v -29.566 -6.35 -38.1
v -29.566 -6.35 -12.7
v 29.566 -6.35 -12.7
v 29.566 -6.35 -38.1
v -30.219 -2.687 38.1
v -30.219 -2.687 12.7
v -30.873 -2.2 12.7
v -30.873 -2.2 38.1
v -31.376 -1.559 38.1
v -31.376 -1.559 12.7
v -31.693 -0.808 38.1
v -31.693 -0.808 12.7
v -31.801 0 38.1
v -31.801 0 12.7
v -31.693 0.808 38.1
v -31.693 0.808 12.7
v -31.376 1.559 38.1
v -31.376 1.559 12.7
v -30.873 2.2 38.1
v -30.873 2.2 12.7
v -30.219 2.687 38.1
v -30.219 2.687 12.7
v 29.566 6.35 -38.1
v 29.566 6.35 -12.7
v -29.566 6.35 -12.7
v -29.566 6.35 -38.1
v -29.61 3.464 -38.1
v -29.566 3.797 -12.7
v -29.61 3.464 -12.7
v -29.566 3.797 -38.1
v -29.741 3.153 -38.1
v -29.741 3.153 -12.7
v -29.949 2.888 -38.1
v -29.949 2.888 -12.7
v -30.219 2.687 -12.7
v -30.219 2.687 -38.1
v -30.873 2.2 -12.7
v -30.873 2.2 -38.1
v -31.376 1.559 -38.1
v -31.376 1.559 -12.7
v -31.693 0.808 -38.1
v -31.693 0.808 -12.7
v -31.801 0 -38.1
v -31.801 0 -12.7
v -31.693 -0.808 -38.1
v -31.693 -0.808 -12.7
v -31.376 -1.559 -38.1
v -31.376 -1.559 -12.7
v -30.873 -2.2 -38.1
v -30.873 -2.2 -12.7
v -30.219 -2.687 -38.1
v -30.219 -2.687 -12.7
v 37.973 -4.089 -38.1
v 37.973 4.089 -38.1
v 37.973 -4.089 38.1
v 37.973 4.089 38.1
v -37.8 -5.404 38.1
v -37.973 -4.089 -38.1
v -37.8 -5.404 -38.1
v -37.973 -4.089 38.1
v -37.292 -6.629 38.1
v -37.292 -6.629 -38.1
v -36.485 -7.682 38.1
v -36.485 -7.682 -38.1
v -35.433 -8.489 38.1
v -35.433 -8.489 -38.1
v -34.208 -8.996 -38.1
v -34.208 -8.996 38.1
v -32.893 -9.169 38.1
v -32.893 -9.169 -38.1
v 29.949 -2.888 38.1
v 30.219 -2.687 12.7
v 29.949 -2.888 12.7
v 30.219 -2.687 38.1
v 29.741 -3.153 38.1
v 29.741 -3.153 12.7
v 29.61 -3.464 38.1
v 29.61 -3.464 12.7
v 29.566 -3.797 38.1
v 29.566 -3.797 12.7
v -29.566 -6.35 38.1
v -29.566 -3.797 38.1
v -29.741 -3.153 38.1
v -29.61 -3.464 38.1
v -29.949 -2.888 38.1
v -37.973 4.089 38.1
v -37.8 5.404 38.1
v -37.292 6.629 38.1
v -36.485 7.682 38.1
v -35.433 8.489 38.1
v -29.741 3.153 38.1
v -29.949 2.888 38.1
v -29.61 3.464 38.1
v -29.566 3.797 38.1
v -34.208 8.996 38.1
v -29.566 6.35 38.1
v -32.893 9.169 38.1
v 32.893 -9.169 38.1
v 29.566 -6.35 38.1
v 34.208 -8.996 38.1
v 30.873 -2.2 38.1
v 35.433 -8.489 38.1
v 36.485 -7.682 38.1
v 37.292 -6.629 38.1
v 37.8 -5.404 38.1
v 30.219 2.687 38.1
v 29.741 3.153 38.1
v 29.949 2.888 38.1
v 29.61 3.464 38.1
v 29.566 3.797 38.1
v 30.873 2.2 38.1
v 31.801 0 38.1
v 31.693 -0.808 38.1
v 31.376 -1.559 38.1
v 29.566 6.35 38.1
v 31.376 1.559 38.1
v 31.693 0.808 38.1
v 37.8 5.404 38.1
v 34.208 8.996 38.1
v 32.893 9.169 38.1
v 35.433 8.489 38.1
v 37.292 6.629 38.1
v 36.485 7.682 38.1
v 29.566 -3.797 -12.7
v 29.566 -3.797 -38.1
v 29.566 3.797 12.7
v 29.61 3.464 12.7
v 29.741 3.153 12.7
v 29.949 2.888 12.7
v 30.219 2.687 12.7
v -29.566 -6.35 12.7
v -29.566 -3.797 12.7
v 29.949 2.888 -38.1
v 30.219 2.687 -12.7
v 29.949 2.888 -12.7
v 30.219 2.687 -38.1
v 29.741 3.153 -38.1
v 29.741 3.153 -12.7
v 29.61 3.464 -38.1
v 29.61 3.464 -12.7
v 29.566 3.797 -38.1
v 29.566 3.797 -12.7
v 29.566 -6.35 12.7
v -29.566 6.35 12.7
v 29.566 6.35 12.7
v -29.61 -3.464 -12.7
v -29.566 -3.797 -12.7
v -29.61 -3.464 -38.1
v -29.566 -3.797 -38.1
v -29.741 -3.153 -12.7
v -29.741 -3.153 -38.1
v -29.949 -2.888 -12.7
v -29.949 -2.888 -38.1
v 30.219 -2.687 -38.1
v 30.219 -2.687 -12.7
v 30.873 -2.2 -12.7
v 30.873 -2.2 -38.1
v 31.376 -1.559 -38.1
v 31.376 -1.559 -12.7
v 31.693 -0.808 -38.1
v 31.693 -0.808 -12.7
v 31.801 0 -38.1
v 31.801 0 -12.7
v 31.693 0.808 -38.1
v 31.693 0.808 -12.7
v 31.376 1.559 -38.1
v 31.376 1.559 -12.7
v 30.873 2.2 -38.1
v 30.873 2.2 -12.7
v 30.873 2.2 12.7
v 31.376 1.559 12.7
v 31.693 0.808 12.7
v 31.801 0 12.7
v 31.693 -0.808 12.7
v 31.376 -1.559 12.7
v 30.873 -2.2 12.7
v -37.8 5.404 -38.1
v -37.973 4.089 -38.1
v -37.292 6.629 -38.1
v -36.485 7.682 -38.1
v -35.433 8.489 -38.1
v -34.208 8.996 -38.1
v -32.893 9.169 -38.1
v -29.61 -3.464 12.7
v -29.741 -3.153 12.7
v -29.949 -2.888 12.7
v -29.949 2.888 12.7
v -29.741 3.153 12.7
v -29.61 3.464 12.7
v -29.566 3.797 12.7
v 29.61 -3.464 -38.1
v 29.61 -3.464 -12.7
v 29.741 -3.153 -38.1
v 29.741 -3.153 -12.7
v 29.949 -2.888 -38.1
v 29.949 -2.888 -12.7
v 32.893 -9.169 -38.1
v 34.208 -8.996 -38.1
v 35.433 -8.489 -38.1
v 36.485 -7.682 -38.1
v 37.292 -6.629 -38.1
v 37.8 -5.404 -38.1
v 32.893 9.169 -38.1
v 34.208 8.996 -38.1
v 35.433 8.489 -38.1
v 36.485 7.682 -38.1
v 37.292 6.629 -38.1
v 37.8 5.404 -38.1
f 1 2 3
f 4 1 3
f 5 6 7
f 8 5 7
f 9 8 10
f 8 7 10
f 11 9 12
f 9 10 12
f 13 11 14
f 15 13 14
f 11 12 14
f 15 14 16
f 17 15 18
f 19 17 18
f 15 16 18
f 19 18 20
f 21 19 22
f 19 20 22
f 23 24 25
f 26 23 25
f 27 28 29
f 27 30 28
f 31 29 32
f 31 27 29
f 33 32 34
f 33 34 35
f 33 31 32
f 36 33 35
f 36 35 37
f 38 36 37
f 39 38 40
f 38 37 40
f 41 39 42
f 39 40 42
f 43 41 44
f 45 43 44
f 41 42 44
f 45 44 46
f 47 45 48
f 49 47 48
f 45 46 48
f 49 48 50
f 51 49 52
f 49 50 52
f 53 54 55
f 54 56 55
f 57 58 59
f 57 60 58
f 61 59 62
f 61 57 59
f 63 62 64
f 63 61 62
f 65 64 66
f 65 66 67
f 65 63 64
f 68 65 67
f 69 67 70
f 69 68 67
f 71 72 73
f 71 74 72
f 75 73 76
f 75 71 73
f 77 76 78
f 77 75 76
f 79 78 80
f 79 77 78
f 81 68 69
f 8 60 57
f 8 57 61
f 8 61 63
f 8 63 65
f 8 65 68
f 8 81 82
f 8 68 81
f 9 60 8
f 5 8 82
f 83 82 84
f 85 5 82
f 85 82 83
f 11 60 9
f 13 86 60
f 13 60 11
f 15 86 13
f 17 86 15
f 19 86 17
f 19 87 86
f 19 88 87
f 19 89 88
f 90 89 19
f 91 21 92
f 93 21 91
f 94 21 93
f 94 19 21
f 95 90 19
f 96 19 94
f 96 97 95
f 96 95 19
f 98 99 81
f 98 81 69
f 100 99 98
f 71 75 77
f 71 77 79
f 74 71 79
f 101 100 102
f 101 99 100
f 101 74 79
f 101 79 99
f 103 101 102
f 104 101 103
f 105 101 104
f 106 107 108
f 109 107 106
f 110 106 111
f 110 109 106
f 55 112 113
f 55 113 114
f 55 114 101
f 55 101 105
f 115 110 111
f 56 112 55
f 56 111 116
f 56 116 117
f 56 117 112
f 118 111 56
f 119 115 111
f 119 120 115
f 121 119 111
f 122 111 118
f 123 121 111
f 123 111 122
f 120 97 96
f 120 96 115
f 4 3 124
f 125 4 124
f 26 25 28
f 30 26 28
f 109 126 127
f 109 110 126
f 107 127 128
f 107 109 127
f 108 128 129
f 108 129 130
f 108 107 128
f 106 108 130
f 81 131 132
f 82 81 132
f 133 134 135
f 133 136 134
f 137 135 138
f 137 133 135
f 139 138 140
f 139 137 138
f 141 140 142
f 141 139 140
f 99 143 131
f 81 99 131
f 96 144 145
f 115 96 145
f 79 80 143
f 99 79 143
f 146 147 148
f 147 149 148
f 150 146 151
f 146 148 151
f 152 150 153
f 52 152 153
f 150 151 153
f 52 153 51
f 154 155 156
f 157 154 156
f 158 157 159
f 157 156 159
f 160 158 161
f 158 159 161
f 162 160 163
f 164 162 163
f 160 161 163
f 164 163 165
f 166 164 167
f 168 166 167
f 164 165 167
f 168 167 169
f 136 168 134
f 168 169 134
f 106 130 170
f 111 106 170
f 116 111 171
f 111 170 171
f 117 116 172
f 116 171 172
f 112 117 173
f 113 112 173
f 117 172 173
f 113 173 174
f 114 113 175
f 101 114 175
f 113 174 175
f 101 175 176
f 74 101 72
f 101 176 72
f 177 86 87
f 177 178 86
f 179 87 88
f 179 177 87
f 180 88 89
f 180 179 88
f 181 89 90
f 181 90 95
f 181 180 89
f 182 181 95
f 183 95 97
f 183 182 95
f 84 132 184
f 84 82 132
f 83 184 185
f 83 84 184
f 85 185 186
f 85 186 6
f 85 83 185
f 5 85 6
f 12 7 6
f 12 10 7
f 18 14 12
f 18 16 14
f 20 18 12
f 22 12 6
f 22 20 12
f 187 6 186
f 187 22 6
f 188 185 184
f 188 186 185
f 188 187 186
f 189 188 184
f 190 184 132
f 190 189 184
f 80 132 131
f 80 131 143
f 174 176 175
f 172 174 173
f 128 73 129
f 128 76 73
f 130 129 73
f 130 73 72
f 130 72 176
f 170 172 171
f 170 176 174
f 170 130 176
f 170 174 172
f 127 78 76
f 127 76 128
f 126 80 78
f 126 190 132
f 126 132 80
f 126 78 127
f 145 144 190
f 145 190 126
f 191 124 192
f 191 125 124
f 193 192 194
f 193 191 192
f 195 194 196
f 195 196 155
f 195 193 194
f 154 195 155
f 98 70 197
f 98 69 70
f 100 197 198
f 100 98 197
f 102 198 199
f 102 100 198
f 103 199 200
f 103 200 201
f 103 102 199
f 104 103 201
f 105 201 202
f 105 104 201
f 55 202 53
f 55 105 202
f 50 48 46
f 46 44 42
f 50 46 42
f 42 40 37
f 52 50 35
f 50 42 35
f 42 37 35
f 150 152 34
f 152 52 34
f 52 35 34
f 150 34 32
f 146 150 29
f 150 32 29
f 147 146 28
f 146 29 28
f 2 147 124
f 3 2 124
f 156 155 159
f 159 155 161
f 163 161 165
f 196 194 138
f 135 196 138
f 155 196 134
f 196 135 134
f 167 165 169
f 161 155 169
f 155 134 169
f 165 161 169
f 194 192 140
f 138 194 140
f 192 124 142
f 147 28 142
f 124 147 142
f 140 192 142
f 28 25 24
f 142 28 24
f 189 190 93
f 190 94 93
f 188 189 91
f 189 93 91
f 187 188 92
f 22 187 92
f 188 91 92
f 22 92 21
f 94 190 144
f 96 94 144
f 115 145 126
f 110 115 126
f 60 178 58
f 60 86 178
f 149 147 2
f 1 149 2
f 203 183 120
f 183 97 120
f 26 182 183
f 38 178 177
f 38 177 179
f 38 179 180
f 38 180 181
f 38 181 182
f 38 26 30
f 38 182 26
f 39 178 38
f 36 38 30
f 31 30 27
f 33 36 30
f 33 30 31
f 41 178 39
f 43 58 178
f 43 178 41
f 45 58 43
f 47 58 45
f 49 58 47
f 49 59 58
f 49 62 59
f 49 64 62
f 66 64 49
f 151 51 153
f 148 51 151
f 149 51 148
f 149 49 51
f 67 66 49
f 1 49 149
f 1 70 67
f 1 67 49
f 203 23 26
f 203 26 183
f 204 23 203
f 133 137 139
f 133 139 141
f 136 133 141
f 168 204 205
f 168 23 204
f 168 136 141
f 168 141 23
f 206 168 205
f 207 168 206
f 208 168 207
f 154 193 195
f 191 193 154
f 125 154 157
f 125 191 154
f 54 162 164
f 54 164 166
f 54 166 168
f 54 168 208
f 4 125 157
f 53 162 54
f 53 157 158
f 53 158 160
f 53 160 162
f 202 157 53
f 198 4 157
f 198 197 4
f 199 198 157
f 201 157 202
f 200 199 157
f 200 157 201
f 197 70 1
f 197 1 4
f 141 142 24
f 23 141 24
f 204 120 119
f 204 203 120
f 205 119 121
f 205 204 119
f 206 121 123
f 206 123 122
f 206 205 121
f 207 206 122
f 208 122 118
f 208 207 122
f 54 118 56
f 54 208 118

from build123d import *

# Parameters (mm, degrees)
F0_W     = 75.946
F0_H     = 18.3388
F1_DEPTH = 12.7
F2_W     = 75.946
F2_H     = 18.3388
F4_DEPTH = 25.4
F3_W     = 75.946
F3_H     = 18.3388
F5_DEPTH = 25.4
F6_R     = 1.27
F7_R     = 5.08


with BuildPart() as f1:
    # F0 (on Top) → F1 (new body, symmetric)
    with BuildSketch(Plane.XY):
        Rectangle(F0_W, F0_H)
    extrude(amount=F1_DEPTH, both=True)

    # F2 (on face) → F4 (join)
    with BuildSketch(Plane.XY.offset(12.7)):
        Rectangle(F2_W, F2_H)
        with BuildLine():
            Line((-29.5656, 2.956892), (-29.5656, 6.35))
            Line((-29.5656, 6.35), (29.5656, 6.35))
            Line((29.5656, 6.35), (29.5656, 2.956892))
            ThreePointArc((29.5656, 2.956892), (31.8008, 0), (29.5656, -2.956892))
            Line((29.5656, -2.956892), (29.5656, -6.35))
            Line((29.5656, -6.35), (-29.5656, -6.35))
            Line((-29.5656, -6.35), (-29.5656, -2.956892))
            ThreePointArc((-29.5656, -2.956892), (-31.8008, 0), (-29.5656, 2.956892))
        make_face(mode=Mode.SUBTRACT)
    extrude(amount=F4_DEPTH)

    # F3 (on face) → F5 (join)
    with BuildSketch(Plane(origin=(0, 0, -12.7), x_dir=(1, 0, 0), z_dir=(0, 0, -1))):
        Rectangle(F3_W, F3_H)
        with BuildLine():
            Line((-29.5656, 2.956892), (-29.5656, 6.35))
            Line((-29.5656, 6.35), (29.5656, 6.35))
            Line((29.5656, 6.35), (29.5656, 2.956892))
            ThreePointArc((29.5656, 2.956892), (31.8008, 0), (29.5656, -2.956892))
            Line((29.5656, -2.956892), (29.5656, -6.35))
            Line((29.5656, -6.35), (-29.5656, -6.35))
            Line((-29.5656, -6.35), (-29.5656, -2.956892))
            ThreePointArc((-29.5656, -2.956892), (-31.8008, 0), (-29.5656, 2.956892))
        make_face(mode=Mode.SUBTRACT)
    extrude(amount=F5_DEPTH)

    # F6
    f6_edges = [f1.edges().sort_by_distance(p)[0] for p in [
        (-29.5656, 2.956892, 25.4),
        (-29.5656, -2.956892, 25.4),
        (29.5656, -2.956892, 25.4),
        (29.5656, 2.956892, 25.4),
        (-29.5656, -2.956892, -25.4),
        (-29.5656, 2.956892, -25.4),
        (29.5656, 2.956892, -25.4),
        (29.5656, -2.956892, -25.4),
    ]]
    fillet(f6_edges, radius=F6_R)

    # F7
    f7_edges = [f1.edges().sort_by_distance(p)[0] for p in [
        (37.973, -9.1694, 0),
        (37.973, 9.1694, 0),
        (-37.973, -9.1694, 0),
        (-37.973, 9.1694, 0),
    ]]
    fillet(f7_edges, radius=F7_R)


solid = f1.part
